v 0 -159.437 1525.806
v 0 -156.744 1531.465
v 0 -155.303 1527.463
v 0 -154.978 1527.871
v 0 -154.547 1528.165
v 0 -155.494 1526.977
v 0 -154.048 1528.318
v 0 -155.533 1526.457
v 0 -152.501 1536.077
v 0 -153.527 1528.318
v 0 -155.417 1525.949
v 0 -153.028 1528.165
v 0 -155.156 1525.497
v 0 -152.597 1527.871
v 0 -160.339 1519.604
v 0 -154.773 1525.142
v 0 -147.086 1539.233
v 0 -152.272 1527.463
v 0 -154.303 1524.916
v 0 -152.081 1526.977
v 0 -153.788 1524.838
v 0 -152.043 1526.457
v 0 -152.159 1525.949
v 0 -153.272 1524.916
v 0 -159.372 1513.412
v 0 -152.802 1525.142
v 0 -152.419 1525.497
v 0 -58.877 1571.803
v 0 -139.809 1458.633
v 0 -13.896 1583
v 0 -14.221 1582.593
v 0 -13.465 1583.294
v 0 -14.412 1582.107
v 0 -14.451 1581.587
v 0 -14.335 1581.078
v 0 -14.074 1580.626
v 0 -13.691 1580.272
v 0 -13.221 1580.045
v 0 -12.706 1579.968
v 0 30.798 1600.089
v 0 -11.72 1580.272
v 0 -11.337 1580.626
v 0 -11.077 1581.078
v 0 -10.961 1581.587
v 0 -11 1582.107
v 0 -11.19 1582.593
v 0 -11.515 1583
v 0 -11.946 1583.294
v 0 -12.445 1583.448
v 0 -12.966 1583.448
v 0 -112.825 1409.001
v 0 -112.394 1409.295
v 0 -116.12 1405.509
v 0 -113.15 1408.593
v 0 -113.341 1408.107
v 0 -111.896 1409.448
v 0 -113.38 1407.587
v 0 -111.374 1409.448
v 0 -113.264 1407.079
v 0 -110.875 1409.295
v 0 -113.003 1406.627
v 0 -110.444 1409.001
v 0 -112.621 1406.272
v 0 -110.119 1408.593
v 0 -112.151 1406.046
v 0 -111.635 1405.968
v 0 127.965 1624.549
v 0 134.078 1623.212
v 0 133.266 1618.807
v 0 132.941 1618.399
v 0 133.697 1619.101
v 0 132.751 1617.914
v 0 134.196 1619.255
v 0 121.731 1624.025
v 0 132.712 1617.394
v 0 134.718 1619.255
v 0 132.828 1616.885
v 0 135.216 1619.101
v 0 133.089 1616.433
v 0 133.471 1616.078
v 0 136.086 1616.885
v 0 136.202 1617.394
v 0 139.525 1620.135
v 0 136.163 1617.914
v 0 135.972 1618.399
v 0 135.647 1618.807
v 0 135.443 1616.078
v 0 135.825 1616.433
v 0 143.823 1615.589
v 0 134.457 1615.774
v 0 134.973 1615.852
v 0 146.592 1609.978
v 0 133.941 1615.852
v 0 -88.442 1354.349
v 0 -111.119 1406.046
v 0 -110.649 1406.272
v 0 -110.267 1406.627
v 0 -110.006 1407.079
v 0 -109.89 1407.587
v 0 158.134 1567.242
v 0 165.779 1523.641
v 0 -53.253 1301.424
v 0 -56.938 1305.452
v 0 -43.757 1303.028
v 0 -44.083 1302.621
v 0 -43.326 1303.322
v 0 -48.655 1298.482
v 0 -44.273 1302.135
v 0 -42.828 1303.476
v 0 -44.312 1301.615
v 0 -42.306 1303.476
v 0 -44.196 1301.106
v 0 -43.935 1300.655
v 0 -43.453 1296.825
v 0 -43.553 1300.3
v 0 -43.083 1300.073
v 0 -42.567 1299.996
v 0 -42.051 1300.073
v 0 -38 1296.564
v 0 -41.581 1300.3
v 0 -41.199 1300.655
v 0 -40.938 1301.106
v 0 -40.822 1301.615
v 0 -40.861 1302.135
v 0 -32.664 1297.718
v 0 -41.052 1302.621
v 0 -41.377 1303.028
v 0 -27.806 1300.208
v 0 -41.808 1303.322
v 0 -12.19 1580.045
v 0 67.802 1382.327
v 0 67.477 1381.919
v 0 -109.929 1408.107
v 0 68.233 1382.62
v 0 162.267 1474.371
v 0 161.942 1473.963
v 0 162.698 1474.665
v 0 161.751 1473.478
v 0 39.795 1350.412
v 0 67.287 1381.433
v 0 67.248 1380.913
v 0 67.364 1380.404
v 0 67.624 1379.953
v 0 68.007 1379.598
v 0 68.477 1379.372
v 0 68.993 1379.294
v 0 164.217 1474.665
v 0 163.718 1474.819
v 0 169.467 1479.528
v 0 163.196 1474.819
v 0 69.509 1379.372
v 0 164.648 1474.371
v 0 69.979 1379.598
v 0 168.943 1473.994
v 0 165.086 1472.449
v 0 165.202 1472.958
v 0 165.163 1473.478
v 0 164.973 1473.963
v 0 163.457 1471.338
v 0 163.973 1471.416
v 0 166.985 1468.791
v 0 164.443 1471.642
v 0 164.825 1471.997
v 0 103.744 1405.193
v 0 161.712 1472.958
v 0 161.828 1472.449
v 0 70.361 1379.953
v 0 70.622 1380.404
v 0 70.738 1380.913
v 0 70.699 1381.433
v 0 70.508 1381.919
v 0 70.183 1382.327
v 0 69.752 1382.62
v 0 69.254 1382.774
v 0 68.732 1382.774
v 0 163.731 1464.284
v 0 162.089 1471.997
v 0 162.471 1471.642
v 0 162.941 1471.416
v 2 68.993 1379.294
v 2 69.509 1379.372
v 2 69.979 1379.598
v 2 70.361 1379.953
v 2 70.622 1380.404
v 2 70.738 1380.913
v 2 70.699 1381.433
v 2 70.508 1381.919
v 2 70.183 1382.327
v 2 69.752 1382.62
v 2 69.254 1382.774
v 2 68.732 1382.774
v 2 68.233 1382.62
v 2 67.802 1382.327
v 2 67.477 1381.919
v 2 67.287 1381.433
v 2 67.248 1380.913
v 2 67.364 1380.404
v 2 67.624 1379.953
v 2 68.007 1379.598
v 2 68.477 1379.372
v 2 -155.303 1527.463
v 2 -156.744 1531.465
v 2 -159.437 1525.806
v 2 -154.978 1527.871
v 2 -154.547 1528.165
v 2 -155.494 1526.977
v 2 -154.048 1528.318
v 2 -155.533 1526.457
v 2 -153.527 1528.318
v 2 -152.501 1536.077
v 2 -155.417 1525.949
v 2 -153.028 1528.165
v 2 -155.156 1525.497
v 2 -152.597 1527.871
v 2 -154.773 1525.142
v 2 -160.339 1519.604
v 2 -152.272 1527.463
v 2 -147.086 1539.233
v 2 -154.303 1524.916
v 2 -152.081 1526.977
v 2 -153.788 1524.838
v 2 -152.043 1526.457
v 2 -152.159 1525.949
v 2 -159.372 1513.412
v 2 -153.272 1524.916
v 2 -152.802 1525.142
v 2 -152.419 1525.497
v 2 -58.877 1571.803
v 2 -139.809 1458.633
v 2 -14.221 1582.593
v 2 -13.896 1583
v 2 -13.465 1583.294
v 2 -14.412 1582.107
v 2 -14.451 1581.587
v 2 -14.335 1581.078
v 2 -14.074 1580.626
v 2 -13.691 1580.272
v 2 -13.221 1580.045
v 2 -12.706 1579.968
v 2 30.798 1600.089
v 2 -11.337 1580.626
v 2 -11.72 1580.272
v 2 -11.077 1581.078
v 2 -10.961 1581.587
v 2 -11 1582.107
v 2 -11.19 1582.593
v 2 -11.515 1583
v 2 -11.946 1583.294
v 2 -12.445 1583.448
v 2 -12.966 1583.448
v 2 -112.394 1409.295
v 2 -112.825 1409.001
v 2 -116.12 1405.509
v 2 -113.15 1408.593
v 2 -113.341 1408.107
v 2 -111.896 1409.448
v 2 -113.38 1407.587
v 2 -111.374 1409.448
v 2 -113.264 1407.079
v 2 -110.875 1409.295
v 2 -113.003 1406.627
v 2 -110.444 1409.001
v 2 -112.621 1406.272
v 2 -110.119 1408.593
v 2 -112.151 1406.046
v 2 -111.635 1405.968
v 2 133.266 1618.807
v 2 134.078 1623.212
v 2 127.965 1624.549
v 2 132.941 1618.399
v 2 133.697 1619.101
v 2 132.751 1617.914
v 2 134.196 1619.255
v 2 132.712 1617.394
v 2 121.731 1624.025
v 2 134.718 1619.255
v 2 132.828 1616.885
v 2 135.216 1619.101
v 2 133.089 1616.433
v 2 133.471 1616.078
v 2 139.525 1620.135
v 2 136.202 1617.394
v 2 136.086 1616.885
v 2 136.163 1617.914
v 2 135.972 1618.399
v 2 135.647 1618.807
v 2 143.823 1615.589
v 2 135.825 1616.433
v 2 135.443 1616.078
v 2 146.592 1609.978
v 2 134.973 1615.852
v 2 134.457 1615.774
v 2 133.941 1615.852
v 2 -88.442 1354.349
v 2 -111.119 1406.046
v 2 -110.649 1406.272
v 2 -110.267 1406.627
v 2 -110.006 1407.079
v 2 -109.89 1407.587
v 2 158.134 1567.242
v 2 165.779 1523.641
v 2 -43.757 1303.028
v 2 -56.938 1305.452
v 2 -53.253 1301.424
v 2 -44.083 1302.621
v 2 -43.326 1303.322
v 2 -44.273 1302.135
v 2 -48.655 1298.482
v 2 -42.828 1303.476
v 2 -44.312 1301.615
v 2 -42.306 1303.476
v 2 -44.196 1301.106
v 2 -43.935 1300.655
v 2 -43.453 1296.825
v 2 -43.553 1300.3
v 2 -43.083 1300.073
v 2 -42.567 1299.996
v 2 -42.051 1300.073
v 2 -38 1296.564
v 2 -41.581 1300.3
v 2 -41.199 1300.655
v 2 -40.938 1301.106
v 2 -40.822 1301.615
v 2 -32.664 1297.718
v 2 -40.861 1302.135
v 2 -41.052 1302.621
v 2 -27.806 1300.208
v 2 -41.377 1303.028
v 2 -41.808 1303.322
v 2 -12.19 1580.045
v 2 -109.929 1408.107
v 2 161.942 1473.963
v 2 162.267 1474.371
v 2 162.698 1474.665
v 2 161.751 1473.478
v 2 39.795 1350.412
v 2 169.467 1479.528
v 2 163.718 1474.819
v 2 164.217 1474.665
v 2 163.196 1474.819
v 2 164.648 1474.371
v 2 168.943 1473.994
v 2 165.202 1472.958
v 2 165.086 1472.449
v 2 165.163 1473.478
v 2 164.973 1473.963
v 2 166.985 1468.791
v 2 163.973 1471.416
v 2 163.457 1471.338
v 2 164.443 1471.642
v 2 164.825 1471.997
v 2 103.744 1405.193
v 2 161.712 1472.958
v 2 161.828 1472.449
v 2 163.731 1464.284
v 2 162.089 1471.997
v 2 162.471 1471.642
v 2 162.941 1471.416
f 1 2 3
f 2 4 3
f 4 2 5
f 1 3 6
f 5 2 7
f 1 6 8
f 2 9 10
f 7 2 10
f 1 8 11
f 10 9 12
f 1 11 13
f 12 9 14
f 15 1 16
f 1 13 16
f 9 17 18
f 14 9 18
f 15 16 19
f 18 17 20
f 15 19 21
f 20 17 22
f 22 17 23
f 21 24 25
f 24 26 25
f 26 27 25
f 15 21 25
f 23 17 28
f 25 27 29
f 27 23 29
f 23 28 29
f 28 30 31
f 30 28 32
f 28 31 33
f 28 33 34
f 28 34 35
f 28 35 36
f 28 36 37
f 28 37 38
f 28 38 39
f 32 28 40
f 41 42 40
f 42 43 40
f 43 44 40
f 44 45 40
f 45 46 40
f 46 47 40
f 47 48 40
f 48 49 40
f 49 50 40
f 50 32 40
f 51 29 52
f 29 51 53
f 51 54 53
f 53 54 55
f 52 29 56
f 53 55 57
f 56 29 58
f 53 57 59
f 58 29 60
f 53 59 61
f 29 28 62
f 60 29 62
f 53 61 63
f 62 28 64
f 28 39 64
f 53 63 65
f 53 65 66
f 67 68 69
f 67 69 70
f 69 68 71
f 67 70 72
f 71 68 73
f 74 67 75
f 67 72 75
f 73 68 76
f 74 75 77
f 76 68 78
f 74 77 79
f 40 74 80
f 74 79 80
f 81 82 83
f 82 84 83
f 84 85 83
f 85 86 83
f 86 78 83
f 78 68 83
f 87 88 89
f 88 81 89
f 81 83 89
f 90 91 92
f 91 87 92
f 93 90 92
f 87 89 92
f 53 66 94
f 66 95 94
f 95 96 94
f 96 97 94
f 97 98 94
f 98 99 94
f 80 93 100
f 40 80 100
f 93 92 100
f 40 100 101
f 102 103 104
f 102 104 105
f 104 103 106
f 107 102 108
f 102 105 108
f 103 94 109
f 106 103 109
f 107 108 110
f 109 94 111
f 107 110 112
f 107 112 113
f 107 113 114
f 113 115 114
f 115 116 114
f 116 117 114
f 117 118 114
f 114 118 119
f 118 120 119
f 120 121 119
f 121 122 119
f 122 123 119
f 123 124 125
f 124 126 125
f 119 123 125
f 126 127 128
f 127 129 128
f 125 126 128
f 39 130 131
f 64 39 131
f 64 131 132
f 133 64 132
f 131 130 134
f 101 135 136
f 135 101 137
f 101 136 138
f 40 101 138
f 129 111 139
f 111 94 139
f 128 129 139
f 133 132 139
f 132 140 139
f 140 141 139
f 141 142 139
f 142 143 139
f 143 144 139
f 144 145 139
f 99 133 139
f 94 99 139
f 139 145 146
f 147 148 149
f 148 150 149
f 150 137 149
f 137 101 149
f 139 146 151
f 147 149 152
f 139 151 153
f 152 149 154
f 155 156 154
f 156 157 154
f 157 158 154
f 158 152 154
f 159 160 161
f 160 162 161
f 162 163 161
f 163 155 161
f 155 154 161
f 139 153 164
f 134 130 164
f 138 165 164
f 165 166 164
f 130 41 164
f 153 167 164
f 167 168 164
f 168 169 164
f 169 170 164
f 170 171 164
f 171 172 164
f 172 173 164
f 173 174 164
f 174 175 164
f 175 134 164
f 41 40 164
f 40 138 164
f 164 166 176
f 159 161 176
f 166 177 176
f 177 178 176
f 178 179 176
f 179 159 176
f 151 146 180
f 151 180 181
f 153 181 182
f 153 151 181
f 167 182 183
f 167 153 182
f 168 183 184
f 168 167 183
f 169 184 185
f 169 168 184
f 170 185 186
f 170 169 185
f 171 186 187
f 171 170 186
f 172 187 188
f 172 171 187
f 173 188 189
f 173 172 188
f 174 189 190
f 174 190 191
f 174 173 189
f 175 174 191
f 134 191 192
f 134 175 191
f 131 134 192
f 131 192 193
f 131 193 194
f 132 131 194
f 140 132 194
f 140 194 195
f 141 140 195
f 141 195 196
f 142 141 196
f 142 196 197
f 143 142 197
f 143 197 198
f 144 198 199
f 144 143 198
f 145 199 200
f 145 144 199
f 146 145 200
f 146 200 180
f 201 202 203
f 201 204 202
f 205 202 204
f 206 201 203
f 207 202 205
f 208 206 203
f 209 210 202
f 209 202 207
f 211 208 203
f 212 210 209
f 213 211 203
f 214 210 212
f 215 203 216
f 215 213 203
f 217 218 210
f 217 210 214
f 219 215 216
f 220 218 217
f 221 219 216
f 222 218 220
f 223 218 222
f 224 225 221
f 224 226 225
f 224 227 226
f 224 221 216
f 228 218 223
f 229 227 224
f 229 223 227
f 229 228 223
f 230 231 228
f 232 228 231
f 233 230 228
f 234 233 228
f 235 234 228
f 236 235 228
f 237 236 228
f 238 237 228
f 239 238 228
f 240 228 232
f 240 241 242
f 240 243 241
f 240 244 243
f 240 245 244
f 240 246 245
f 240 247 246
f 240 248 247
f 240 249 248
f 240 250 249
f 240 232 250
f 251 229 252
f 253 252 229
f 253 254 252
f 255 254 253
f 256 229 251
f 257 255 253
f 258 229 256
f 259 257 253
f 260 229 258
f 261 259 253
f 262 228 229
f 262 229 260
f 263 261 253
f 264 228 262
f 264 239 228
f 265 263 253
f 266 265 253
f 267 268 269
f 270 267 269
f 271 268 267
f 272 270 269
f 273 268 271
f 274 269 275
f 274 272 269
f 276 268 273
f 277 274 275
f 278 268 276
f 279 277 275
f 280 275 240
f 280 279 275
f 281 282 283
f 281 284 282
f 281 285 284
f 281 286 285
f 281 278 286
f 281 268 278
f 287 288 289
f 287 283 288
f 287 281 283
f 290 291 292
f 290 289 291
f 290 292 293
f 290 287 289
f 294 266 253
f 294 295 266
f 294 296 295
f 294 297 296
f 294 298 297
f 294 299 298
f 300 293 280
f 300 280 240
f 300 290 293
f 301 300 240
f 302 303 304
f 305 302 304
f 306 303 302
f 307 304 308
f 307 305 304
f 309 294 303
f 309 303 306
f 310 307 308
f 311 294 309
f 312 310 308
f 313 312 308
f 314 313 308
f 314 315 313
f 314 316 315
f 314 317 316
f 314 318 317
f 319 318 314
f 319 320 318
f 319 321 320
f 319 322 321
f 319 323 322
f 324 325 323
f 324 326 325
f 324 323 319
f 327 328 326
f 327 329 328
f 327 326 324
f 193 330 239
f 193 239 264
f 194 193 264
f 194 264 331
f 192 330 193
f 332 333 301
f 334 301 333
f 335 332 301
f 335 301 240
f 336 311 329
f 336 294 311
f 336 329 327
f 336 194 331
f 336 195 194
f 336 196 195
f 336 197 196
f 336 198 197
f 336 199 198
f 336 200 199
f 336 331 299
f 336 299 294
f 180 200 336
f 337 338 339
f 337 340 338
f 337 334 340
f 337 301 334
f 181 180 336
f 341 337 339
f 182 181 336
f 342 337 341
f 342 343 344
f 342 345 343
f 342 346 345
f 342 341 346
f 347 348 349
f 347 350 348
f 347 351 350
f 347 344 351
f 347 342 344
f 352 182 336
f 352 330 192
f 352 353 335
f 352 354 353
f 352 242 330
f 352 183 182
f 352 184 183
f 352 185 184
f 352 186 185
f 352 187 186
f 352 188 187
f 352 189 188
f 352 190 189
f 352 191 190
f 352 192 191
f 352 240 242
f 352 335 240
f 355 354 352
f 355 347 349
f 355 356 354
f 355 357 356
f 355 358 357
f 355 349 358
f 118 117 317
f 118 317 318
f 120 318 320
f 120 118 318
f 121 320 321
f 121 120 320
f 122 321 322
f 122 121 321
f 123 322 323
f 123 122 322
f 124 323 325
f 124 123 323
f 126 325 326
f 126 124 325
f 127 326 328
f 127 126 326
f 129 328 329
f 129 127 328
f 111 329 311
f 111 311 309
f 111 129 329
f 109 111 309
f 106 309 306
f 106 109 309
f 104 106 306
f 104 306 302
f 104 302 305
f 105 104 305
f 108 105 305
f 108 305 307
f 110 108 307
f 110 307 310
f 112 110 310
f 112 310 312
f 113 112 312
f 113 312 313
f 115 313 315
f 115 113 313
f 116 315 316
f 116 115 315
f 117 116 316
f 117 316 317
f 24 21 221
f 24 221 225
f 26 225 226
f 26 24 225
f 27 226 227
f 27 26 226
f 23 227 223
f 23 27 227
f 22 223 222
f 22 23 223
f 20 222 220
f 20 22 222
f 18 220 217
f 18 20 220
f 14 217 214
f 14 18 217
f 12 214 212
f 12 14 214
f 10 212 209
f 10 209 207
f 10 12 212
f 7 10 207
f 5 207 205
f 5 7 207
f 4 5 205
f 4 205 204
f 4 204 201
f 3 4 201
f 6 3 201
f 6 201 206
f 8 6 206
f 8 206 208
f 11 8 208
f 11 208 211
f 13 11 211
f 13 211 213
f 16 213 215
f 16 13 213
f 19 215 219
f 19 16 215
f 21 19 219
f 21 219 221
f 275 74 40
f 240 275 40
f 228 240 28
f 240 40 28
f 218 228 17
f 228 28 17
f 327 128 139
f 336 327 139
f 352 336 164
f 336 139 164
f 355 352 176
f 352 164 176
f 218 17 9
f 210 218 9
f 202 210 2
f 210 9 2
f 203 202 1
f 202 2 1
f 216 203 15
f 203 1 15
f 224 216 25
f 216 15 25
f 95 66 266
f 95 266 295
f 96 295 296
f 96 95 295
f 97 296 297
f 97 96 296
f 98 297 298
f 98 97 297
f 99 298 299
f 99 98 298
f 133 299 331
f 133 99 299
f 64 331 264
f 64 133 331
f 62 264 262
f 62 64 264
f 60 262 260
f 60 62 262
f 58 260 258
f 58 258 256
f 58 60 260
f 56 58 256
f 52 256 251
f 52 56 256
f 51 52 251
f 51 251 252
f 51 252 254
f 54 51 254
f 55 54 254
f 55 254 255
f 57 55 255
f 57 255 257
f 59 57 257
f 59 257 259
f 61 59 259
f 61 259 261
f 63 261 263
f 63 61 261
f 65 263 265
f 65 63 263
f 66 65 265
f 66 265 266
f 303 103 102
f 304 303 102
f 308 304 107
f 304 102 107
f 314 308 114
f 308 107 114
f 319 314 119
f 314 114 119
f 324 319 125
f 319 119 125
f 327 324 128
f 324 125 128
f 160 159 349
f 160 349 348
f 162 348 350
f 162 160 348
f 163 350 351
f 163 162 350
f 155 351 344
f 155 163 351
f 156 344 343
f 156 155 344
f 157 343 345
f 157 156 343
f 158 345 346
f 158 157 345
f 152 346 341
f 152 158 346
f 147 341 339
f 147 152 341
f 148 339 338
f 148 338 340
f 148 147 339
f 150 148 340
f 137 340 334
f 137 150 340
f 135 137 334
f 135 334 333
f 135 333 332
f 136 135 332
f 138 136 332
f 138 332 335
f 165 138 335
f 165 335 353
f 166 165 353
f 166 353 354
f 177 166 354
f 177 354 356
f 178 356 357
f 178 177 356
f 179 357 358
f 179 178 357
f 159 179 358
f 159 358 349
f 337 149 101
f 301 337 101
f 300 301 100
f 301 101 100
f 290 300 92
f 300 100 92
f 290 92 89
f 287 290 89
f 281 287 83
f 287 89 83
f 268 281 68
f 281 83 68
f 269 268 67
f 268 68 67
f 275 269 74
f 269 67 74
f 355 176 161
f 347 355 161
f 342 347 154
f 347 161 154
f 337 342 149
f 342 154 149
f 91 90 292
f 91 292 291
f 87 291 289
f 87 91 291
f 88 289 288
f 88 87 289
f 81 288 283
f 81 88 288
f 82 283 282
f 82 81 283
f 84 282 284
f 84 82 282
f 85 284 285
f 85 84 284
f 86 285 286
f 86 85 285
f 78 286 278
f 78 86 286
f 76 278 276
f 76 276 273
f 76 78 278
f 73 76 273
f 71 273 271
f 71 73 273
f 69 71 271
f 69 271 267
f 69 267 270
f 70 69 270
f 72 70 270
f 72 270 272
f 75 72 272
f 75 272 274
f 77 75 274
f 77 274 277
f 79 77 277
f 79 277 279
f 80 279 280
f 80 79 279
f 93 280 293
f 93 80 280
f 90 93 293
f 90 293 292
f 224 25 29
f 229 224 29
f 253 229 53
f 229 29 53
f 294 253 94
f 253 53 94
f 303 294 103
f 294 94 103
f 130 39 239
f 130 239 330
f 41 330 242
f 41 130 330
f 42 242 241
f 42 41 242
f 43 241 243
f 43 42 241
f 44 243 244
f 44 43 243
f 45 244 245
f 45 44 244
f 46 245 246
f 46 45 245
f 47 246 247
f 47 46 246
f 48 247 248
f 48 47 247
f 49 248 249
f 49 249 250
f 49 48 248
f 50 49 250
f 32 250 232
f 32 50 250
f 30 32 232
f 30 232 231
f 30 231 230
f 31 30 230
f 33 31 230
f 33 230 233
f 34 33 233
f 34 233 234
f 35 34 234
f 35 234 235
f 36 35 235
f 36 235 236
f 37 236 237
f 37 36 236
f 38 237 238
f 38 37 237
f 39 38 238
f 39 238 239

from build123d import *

# Parameters (mm, degrees)
CROQUIS2_R              = 1.75
SALIENTE_EXTRUIR1_DEPTH = 2


with BuildPart() as part:
    # Croquis2 → Saliente-Extruir1 (new body)
    with BuildSketch(Plane(origin=(0, 0, 0), x_dir=(0, 0, -1), z_dir=(1, 0, 0))):
        with BuildLine():
            ThreePointArc((-1624.025321873, 121.730654261), (-1586.485988342, -14.209738678), (-1539.232552396, -147.086014911))
            ThreePointArc((-1539.232552396, -147.086014911), (-1528.736264964, -158.30256709), (-1513.411789801, -159.371937759))
            ThreePointArc((-1513.411789801, -159.371937759), (-1405.508639065, -116.120173058), (-1305.452205903, -56.938121124))
            ThreePointArc((-1305.452205903, -56.938121124), (-1296.824738042, -43.452916514), (-1300.208231124, -27.805682905))
            ThreePointArc((-1300.208231124, -27.805682905), (-1377.246544078, 72.245539551), (-1464.284458168, 163.730785841))
            ThreePointArc((-1464.284458168, 163.730785841), (-1471.327397008, 168.136856279), (-1479.527832165, 169.467009446))
            ThreePointArc((-1479.527832165, 169.467009446), (-1545.52768268, 162.44811464), (-1609.97790425, 146.592071884))
            ThreePointArc((-1609.97790425, 146.592071884), (-1621.877582945, 136.916426614), (-1624.025321873, 121.730654261))
        make_face()
        with Locations((-1581.717582688, -12.705641768)):
            Circle(CROQUIS2_R, mode=Mode.SUBTRACT)
        with Locations((-1526.587976686, -153.787607791)):
            Circle(CROQUIS2_R, mode=Mode.SUBTRACT)
        with Locations((-1617.52441717, 134.456762464)):
            Circle(CROQUIS2_R, mode=Mode.SUBTRACT)
        with Locations((-1407.717991662, -111.634778861)):
            Circle(CROQUIS2_R, mode=Mode.SUBTRACT)
        with Locations((-1301.74565066, -42.567129287)):
            Circle(CROQUIS2_R, mode=Mode.SUBTRACT)
        with Locations((-1381.043785842, 68.992701562)):
            Circle(CROQUIS2_R, mode=Mode.SUBTRACT)
        with Locations((-1473.088384765, 163.457227863)):
            Circle(CROQUIS2_R, mode=Mode.SUBTRACT)
    extrude(amount=SALIENTE_EXTRUIR1_DEPTH)


solid = part.part
